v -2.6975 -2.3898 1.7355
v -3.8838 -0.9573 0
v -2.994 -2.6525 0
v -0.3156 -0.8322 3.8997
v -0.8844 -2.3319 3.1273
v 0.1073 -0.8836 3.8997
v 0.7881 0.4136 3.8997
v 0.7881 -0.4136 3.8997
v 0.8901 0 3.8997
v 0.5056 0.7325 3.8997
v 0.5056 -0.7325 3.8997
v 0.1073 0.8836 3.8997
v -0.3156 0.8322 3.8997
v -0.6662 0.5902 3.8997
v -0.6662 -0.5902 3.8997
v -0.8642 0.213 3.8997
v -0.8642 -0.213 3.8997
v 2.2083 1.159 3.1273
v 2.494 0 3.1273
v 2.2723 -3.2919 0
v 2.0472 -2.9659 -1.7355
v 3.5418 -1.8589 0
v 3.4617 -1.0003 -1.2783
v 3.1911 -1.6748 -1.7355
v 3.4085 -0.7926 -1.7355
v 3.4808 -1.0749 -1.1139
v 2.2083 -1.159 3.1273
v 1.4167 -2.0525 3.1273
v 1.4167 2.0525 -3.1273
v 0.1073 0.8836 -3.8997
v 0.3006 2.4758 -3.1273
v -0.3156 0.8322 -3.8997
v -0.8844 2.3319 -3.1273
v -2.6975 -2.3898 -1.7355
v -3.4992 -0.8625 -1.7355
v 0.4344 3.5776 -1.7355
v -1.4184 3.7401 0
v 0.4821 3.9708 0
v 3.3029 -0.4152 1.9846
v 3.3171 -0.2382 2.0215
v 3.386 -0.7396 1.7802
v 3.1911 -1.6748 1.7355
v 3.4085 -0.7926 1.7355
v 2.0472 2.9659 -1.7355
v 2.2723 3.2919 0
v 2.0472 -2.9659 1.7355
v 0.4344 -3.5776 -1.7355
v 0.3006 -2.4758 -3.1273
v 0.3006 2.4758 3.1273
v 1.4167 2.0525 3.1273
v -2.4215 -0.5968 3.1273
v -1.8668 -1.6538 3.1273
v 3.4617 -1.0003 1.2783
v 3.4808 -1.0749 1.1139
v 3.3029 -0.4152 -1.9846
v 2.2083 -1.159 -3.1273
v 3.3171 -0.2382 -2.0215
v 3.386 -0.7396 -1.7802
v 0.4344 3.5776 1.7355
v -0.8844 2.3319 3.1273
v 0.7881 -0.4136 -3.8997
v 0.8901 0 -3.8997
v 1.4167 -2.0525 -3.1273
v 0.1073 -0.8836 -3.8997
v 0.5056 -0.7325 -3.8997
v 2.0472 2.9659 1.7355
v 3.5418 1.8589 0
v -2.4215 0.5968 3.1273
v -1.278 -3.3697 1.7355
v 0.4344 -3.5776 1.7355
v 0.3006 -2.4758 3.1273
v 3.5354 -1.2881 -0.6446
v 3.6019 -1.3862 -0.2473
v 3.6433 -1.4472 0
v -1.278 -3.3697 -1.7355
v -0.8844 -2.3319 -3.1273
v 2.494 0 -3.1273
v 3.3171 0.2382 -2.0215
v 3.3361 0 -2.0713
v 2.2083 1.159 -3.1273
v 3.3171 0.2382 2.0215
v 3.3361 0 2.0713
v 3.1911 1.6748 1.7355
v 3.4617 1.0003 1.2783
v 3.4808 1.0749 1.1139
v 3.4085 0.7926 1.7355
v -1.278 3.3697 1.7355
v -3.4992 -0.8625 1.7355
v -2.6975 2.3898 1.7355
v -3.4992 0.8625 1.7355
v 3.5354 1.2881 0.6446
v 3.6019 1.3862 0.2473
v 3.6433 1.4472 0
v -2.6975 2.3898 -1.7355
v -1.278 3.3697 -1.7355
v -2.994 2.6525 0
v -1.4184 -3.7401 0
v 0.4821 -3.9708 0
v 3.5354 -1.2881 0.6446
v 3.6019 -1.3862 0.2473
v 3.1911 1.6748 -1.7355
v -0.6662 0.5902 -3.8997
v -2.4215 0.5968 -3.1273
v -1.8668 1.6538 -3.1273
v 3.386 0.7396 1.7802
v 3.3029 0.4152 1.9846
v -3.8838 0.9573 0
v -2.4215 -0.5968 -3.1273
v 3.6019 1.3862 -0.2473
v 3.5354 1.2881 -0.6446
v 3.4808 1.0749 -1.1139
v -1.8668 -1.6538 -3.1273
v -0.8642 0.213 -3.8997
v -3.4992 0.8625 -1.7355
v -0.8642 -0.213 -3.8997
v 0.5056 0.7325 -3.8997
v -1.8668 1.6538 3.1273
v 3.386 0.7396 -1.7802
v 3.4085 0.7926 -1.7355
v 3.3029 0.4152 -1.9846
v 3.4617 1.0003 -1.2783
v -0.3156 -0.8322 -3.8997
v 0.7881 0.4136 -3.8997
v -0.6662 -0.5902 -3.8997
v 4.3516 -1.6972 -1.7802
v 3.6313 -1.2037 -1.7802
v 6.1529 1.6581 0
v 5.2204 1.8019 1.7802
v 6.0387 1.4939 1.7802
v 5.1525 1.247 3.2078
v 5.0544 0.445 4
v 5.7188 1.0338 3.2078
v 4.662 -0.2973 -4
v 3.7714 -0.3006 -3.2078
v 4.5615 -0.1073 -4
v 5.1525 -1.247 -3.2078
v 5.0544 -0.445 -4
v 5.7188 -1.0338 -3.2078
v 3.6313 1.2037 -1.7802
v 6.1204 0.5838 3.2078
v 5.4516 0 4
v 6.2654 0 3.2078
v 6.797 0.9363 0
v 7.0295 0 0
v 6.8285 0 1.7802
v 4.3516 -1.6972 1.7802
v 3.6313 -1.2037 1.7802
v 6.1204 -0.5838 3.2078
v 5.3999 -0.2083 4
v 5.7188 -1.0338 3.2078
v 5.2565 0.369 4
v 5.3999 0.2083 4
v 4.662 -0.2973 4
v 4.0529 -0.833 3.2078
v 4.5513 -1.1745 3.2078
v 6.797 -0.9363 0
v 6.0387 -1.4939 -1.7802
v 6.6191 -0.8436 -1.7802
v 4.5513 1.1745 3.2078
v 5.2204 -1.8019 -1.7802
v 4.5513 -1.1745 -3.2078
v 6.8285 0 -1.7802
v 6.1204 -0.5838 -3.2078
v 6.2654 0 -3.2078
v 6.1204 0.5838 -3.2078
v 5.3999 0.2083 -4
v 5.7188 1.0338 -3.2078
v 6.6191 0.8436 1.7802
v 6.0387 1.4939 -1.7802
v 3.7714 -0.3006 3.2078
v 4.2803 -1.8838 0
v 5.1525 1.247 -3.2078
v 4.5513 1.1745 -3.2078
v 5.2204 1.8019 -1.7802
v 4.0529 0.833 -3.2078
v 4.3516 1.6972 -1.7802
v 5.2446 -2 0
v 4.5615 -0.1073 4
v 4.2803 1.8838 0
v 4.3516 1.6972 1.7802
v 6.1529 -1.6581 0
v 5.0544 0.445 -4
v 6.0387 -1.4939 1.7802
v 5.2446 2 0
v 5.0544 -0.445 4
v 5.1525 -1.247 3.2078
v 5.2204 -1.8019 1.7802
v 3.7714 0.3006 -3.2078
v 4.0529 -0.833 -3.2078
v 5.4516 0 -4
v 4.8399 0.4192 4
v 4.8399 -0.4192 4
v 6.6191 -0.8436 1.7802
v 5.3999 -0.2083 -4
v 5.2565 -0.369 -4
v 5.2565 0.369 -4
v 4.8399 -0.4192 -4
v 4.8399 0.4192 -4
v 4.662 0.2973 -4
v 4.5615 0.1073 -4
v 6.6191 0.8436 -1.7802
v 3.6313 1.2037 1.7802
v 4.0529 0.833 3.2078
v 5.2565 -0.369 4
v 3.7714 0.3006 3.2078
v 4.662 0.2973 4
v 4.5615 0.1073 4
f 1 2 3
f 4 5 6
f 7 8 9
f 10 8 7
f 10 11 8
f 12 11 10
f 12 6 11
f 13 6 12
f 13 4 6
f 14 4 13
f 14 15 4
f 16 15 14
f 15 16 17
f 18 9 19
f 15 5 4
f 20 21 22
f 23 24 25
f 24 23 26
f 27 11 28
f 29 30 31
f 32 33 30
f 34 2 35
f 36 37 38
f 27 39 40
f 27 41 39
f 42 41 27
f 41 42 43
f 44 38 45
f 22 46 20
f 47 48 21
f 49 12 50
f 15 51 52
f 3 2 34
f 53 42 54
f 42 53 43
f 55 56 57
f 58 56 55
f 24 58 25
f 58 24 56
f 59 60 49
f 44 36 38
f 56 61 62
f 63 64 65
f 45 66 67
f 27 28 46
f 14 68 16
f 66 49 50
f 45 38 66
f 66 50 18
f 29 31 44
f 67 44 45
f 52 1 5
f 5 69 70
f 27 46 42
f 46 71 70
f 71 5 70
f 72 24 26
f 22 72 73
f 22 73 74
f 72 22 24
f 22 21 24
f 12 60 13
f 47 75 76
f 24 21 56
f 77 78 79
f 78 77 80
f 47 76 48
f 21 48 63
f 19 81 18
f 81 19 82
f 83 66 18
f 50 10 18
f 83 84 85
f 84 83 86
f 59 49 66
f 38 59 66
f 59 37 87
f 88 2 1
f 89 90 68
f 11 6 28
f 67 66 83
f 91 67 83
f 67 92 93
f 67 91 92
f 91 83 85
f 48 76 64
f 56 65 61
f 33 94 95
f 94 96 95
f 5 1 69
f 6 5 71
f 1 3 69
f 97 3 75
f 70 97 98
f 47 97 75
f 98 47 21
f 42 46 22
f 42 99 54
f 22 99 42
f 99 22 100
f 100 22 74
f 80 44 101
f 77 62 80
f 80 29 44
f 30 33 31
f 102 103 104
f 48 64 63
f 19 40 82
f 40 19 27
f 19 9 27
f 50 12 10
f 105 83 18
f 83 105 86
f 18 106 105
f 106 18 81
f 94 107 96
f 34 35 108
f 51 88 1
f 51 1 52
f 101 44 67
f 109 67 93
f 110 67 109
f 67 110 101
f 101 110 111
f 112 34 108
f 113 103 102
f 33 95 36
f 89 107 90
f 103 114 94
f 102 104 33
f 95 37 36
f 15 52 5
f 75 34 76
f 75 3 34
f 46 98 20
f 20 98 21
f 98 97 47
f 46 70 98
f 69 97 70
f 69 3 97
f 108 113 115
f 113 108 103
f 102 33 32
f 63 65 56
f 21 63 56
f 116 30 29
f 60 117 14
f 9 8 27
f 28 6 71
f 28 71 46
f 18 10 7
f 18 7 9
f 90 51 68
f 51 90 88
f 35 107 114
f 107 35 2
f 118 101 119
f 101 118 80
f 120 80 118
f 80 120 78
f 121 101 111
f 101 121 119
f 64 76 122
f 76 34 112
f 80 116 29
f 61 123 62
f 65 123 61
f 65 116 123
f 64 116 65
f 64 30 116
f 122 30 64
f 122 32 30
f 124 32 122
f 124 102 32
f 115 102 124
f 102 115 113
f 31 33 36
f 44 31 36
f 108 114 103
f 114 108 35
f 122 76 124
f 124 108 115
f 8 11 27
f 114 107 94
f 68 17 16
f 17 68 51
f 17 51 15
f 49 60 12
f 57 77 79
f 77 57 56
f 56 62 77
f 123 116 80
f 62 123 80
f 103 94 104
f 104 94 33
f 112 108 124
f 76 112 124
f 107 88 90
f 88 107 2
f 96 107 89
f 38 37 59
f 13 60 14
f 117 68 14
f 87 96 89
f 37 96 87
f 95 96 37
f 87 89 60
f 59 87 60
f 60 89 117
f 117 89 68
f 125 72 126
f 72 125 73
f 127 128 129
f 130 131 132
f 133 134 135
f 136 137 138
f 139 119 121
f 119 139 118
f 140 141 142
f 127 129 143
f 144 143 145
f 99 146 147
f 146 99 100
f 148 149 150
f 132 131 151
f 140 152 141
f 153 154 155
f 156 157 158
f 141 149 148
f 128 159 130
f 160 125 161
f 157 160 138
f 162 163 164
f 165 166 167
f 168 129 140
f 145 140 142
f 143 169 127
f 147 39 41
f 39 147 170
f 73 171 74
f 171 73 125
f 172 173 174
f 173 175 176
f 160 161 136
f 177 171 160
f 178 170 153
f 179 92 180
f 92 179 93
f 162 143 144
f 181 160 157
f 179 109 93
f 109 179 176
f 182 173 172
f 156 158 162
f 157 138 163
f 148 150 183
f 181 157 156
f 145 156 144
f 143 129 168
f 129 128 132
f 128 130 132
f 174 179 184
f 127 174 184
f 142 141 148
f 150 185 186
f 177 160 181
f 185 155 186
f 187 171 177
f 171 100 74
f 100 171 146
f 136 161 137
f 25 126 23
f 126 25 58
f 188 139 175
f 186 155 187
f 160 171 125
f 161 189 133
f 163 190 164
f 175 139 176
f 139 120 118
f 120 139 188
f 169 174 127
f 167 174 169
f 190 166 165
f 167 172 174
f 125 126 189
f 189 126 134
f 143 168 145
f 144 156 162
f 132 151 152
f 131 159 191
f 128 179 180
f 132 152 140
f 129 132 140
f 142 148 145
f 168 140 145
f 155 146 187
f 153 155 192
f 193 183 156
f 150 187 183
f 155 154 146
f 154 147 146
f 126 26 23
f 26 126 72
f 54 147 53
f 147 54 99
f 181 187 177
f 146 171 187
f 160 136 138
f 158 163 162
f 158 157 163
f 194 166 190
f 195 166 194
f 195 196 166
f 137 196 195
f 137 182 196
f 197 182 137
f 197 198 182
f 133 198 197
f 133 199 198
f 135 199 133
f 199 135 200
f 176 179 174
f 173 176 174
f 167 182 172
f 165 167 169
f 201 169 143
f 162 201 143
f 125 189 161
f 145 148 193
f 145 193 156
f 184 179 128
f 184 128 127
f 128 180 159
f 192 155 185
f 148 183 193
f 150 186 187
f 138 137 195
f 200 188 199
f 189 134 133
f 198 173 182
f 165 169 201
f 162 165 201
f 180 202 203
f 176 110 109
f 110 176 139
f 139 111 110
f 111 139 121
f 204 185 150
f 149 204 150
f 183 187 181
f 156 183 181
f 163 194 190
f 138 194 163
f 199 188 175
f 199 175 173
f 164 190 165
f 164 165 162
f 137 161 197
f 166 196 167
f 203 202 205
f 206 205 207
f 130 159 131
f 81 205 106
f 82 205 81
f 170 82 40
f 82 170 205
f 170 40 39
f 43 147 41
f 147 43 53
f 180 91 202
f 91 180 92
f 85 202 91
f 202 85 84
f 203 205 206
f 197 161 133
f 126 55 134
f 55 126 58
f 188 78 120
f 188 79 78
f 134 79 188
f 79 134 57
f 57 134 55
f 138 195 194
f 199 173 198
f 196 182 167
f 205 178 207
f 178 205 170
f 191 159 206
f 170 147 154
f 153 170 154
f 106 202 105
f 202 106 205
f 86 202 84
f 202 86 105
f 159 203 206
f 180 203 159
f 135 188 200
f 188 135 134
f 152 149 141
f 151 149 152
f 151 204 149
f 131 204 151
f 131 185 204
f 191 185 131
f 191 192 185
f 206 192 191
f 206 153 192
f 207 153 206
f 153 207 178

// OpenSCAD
union() {
    sphere(r=4);
    translate(v=[5, 0, 0]) {
        resize(newsize=[4, 4, 8]) {
            sphere(r=4);
        };
    };
};
